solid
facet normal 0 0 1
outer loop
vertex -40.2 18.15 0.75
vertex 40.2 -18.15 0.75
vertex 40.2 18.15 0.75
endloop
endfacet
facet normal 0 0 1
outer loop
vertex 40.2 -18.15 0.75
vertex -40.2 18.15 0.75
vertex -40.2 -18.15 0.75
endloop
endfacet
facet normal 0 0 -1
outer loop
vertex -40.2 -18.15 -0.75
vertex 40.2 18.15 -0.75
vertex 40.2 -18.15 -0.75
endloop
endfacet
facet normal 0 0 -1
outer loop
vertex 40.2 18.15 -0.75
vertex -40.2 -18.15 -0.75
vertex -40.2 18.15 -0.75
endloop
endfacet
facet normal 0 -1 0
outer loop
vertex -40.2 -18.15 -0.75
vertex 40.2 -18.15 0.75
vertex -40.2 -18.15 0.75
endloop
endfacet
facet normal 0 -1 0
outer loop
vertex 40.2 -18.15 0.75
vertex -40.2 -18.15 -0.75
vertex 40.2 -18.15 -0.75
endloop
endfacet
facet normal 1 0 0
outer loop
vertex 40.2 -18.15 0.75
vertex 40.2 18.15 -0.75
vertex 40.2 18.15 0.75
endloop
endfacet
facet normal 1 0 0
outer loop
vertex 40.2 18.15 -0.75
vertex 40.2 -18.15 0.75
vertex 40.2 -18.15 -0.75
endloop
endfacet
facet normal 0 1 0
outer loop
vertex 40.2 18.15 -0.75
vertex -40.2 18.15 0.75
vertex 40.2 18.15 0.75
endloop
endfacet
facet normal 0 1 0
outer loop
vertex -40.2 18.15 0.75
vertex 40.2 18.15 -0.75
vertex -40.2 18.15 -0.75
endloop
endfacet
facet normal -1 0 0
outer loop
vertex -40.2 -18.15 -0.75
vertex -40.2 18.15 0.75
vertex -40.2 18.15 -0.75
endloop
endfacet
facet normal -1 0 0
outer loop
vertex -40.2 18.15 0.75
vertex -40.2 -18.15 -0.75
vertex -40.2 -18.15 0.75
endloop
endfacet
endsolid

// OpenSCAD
translate([-80.4/2, -36.3/2, -1.5/2])
    cube([80.4, 36.3, 1.5]);
